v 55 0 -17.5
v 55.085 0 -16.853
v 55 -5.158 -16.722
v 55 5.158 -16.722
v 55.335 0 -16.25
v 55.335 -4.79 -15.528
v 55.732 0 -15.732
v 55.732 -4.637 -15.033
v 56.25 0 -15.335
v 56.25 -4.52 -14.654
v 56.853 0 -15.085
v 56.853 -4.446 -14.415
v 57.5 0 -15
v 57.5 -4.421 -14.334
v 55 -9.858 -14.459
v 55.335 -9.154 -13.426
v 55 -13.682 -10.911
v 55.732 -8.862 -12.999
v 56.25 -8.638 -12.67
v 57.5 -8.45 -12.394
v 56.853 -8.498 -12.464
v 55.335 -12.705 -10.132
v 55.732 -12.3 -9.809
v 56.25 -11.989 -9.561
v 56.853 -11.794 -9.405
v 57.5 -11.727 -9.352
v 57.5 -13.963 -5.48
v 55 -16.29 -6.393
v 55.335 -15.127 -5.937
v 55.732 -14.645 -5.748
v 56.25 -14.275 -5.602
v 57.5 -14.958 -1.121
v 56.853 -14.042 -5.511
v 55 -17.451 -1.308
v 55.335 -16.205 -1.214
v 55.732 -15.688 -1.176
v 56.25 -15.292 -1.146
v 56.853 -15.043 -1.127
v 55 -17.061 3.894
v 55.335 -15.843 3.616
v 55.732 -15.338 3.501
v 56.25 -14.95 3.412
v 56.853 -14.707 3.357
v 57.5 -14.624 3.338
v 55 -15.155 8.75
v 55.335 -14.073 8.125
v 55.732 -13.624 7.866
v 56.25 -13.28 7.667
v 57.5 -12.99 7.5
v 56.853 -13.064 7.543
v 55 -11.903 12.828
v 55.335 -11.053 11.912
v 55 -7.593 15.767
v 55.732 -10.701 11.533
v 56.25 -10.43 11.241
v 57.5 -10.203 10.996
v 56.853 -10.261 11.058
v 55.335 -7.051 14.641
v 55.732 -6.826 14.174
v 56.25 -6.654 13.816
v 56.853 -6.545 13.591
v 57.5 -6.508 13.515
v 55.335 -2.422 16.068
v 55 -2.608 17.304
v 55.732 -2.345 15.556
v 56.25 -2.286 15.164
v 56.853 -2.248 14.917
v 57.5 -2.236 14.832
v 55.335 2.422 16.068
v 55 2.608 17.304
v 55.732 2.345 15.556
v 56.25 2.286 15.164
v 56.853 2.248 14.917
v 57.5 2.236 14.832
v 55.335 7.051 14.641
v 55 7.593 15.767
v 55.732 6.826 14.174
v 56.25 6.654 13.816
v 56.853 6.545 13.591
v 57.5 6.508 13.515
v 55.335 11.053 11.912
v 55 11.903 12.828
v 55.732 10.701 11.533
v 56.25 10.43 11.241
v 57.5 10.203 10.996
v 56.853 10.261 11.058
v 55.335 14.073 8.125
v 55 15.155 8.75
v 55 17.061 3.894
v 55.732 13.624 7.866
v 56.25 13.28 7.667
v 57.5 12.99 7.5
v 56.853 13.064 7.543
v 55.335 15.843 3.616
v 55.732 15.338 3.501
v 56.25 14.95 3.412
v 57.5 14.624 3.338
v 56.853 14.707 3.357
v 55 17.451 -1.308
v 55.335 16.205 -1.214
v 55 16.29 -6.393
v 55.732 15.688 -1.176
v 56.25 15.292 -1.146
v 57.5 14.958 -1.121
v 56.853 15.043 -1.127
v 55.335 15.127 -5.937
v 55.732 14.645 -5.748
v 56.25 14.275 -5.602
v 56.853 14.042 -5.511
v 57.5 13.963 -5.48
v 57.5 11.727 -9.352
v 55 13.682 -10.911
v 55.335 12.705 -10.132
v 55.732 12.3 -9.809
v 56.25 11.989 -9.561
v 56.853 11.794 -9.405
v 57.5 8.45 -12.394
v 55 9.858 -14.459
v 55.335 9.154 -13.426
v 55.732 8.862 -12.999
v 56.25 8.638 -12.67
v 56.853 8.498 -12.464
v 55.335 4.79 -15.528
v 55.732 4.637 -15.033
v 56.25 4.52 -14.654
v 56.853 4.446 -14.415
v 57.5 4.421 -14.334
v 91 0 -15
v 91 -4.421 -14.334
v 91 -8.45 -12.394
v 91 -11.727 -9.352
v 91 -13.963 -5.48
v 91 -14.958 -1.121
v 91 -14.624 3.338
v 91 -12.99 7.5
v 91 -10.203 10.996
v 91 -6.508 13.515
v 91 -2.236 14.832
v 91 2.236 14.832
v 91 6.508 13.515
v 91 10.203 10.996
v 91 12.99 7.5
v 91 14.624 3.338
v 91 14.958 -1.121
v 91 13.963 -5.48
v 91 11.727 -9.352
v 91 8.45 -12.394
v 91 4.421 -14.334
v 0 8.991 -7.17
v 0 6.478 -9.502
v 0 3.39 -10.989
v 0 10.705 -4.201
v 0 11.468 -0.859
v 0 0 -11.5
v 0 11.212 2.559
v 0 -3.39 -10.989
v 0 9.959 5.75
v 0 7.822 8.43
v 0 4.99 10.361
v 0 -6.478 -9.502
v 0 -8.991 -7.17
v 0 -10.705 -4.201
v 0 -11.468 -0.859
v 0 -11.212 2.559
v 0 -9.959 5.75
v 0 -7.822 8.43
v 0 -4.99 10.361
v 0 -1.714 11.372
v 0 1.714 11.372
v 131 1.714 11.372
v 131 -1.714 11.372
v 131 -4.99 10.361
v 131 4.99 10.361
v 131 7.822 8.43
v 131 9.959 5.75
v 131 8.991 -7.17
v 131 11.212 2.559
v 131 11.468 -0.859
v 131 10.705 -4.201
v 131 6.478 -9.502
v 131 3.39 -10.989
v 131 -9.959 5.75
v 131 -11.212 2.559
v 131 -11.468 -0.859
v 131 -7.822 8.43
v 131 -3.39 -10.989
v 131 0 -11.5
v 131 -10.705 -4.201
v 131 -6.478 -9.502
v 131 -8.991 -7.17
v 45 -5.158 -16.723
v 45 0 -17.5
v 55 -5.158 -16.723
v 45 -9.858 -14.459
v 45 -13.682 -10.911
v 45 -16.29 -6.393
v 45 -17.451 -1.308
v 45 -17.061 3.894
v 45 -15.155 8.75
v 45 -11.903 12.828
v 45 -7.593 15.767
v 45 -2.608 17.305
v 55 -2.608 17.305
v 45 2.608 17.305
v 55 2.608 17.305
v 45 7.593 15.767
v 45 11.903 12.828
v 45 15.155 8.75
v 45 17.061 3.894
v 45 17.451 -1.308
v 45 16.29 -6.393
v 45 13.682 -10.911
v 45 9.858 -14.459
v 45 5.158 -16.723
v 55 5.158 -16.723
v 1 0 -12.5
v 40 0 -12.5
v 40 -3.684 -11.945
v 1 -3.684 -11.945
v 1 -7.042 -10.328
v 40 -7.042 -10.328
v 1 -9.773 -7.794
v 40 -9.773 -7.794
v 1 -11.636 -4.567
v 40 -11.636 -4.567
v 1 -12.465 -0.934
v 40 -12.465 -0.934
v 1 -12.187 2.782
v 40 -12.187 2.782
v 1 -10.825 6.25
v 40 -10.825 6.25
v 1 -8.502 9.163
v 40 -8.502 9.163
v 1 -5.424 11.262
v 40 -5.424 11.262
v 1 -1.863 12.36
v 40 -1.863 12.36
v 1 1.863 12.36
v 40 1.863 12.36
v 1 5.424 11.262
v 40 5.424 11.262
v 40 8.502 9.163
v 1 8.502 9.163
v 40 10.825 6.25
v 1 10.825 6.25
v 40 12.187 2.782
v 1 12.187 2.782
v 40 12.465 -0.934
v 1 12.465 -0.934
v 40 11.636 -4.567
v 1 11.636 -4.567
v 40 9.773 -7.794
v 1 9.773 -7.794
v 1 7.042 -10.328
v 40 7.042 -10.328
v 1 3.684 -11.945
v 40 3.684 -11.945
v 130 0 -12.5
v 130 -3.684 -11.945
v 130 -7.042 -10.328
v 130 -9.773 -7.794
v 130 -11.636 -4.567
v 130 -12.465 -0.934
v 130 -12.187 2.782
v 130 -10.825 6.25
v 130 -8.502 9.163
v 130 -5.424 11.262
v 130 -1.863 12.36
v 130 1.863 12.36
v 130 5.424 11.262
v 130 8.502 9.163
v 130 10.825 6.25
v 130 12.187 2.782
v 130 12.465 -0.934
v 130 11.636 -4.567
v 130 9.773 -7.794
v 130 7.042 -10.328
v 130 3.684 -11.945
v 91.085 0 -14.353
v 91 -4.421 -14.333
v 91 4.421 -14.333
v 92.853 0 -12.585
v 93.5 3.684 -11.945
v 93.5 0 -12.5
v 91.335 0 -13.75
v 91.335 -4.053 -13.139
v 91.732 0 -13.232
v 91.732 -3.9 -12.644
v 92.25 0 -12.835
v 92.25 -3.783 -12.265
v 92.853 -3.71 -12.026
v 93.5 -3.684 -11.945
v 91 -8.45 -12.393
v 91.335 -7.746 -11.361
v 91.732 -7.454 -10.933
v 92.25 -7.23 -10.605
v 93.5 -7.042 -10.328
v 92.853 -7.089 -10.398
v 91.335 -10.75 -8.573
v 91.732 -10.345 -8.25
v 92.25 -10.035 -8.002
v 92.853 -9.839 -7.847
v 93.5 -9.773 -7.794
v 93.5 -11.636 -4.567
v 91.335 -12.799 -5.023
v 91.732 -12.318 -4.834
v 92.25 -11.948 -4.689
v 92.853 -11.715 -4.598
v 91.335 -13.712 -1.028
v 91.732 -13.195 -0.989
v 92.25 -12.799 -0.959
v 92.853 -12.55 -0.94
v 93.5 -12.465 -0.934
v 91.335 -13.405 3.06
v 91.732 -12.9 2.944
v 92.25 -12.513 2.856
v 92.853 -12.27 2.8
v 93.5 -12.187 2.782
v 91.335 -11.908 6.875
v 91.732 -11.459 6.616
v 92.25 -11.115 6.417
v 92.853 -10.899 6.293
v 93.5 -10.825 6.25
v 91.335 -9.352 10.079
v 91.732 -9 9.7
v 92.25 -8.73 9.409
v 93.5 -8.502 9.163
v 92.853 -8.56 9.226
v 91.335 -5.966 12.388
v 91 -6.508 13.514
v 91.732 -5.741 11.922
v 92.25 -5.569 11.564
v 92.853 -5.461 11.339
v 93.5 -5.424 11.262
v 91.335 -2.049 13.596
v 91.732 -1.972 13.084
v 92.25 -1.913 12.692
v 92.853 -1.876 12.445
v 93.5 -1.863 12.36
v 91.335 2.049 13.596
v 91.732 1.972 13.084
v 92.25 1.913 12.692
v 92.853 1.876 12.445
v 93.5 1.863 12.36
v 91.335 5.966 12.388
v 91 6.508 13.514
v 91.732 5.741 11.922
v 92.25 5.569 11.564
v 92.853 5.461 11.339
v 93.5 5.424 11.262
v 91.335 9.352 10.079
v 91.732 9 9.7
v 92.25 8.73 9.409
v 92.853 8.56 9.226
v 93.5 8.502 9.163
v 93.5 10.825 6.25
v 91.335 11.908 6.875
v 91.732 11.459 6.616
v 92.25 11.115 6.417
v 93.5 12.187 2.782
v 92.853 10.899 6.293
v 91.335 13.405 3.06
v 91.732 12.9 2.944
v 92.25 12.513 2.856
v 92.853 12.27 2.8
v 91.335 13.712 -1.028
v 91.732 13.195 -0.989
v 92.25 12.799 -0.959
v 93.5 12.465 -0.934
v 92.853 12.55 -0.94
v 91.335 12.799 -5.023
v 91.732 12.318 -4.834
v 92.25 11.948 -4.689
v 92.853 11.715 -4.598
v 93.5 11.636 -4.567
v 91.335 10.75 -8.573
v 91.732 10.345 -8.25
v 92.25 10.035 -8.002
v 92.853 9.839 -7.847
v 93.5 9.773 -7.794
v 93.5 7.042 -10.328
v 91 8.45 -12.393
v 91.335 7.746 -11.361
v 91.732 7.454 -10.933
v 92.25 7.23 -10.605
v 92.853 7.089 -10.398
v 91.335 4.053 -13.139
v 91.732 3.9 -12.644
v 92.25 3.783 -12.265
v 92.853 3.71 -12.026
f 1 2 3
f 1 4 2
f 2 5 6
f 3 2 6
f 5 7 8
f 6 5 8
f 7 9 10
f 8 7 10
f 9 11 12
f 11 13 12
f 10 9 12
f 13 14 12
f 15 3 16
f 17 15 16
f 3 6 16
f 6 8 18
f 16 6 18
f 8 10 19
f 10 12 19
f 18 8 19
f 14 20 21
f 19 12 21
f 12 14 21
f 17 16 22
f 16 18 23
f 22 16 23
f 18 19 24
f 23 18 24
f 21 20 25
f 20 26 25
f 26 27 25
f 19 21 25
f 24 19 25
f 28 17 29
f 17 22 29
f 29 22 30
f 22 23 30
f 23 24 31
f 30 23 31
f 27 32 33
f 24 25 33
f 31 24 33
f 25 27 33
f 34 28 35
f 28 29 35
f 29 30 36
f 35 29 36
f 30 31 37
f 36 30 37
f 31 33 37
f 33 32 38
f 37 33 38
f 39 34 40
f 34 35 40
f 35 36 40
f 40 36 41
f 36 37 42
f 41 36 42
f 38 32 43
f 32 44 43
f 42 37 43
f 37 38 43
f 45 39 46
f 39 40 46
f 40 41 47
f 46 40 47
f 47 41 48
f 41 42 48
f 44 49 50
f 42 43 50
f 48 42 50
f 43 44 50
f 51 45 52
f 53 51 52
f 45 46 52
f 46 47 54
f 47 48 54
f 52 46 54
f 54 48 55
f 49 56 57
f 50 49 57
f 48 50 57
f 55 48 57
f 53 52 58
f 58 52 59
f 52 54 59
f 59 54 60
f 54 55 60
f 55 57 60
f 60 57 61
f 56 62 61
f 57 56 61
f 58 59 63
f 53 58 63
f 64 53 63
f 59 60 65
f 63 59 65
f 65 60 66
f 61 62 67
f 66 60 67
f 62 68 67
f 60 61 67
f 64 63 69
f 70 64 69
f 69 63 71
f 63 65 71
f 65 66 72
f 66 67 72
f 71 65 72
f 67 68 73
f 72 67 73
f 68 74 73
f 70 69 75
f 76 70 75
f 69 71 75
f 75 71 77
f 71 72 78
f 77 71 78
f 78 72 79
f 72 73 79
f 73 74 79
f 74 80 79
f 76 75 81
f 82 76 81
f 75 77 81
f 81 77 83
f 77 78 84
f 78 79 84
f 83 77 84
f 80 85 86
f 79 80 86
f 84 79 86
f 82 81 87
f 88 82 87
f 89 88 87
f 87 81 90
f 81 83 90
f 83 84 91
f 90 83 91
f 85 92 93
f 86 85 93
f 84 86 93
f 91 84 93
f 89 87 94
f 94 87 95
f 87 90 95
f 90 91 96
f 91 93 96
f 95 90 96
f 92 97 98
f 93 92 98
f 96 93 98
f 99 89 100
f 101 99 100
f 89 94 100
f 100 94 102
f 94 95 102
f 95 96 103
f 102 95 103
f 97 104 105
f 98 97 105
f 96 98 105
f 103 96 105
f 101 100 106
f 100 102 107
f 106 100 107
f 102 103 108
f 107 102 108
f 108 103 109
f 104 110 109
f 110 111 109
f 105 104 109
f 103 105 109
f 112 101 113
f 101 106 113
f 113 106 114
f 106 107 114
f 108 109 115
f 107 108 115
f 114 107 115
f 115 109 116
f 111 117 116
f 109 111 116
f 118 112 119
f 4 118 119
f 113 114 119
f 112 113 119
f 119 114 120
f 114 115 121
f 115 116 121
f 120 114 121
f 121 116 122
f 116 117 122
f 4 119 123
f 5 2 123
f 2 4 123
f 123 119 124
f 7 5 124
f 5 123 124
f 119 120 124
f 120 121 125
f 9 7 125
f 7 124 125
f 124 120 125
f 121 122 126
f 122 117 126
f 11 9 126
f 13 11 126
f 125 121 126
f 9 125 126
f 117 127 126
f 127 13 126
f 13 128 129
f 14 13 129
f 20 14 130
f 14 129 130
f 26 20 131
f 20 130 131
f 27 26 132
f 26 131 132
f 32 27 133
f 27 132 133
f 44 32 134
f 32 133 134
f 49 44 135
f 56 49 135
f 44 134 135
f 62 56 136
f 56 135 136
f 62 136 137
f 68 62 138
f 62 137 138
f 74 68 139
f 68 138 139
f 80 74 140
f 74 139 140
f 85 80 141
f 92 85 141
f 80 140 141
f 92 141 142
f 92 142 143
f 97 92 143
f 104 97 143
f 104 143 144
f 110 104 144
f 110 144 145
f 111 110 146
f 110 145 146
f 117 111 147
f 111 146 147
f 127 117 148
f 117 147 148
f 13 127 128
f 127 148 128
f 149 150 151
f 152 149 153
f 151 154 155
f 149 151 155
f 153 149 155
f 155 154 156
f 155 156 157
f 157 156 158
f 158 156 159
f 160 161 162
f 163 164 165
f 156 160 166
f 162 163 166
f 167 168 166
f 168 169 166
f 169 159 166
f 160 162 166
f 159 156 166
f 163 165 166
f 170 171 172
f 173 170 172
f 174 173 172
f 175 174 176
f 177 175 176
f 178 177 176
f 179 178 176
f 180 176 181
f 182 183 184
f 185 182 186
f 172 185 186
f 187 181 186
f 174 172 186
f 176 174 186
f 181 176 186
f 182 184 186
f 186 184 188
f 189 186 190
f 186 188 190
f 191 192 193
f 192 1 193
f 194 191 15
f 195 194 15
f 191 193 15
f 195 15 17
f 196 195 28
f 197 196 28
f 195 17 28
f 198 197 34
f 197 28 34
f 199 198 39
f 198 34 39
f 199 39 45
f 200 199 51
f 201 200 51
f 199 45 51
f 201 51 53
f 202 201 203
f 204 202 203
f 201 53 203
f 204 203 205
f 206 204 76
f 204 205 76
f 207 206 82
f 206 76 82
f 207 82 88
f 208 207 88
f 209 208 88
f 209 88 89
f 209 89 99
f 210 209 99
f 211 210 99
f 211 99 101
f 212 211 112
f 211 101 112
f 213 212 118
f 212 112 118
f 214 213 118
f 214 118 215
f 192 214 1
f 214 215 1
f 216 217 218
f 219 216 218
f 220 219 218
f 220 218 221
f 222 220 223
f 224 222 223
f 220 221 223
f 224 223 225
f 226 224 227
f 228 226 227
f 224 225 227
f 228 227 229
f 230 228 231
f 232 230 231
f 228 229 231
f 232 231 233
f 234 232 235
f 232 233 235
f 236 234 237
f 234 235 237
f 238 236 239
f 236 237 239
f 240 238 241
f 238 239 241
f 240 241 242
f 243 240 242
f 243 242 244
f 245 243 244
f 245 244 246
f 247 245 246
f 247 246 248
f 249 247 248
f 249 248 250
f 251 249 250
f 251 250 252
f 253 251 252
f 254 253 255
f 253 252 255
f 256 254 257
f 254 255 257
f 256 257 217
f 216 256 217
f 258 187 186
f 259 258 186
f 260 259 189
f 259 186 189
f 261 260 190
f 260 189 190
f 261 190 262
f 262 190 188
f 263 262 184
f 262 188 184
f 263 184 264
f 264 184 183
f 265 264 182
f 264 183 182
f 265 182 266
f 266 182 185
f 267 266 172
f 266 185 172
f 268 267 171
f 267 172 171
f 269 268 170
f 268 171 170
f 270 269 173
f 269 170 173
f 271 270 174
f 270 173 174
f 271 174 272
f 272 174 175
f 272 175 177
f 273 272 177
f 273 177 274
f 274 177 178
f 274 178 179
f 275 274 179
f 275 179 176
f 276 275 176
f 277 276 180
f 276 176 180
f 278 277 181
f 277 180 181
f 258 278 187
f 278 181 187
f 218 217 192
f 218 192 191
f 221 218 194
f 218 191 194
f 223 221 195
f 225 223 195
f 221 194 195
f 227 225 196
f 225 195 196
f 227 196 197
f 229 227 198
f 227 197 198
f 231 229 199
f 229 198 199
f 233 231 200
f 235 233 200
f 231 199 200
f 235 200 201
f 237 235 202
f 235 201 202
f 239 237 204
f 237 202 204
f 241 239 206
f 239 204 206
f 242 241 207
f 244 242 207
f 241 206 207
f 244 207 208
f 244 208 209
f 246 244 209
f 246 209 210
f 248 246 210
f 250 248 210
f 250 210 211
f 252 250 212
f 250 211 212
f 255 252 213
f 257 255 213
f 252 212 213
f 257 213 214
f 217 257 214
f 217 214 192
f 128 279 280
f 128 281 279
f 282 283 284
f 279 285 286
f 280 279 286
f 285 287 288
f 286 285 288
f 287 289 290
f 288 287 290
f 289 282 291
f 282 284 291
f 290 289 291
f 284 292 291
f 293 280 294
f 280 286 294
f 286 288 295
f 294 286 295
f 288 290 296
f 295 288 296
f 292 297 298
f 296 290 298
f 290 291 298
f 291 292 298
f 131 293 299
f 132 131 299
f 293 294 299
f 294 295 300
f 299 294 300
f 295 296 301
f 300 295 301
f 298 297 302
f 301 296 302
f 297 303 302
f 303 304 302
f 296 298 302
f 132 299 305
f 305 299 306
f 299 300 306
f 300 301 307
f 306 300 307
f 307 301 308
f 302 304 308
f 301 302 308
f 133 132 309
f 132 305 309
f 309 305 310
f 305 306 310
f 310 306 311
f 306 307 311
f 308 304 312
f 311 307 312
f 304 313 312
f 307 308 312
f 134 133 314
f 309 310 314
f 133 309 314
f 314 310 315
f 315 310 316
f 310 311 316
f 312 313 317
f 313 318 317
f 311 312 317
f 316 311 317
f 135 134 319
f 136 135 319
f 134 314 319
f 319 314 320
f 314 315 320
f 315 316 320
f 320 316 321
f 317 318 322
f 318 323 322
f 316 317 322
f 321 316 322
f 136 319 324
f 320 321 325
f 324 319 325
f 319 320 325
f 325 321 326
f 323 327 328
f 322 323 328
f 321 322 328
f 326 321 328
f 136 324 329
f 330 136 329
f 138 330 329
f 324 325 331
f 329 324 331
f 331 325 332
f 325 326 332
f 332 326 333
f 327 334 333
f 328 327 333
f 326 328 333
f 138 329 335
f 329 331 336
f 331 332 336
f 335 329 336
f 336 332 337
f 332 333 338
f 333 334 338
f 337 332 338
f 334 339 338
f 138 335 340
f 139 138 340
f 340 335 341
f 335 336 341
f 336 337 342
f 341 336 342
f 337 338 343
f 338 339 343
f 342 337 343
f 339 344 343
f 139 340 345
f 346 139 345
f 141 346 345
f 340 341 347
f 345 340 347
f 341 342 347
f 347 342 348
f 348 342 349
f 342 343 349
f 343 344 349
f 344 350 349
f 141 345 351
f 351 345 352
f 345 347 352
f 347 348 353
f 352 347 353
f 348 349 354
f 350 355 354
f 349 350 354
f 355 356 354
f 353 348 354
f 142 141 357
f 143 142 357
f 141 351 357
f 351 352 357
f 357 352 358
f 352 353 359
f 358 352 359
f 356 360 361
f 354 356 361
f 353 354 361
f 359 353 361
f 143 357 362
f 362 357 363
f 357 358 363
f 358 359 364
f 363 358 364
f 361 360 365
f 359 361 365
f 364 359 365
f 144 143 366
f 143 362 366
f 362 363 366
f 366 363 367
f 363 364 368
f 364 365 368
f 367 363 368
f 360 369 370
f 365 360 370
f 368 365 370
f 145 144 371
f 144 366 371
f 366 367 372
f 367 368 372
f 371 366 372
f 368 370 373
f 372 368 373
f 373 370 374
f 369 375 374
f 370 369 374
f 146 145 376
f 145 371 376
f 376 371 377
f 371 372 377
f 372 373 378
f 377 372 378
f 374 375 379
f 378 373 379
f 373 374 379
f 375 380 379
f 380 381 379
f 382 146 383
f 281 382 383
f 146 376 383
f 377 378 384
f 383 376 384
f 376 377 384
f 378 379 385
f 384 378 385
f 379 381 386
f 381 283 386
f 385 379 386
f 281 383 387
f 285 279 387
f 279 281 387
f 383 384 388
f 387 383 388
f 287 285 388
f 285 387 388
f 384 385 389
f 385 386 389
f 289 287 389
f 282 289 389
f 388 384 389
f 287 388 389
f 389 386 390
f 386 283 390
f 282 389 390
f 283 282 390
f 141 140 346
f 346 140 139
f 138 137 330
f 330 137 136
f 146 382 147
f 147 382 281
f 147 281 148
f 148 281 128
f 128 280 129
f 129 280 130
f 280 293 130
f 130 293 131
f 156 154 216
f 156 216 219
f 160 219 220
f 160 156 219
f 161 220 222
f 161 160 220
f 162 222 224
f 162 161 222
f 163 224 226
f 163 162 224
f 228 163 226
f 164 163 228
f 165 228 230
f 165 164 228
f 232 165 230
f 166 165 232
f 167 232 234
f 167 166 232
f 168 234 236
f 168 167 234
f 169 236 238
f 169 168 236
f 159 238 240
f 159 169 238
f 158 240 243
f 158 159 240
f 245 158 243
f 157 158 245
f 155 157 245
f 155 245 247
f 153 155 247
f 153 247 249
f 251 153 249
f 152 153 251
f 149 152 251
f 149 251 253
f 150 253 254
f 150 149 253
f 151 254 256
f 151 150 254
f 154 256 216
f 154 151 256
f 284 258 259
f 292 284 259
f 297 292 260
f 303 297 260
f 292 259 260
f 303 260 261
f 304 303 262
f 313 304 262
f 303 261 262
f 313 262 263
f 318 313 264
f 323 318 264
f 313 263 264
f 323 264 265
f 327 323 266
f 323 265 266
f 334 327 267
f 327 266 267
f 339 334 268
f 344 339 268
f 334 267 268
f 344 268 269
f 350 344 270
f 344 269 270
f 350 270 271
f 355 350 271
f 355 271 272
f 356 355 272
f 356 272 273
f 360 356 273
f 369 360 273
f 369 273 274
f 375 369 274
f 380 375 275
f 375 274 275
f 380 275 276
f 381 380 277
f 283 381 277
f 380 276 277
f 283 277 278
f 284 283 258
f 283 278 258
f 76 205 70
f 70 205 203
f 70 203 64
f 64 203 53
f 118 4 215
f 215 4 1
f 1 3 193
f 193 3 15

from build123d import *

# Parameters (mm, degrees)
FILLET1_R     = 2.5
CHAMFER2_SIZE = 1


with BuildPart() as part:
    # Sketch1 → Revolve1 (revolve)
    with BuildSketch(Plane.XY, mode=Mode.PRIVATE) as revolve1_sk:
        Polygon((0, 0), (0, 12.5), (40, 12.5), (45, 17.5), (55, 17.5), (55, 15), (91, 15), (91, 12.5), (131, 12.5), (131, 0), align=None)
    revolve(revolve1_sk.sketch.rotate(Axis((131, 0, 0), (-1, 0, 0)), 90), axis=Axis((131, 0, 0), (-1, 0, 0)))

    # Fillet1
    fillet1_edges = [part.edges().sort_by_distance(p)[0] for p in [
        (91, 0, 12.5),
        (55, 0, 15),
    ]]
    fillet(fillet1_edges, radius=FILLET1_R - 0.0001)  # a hair under: the kernel refuses the full size

    # Chamfer2
    chamfer2_edges = [part.edges().sort_by_distance(p)[0] for p in [
        (0, 0, 12.5),
        (131, 0, 12.5),
    ]]
    chamfer(chamfer2_edges, length=CHAMFER2_SIZE)


solid = part.part
